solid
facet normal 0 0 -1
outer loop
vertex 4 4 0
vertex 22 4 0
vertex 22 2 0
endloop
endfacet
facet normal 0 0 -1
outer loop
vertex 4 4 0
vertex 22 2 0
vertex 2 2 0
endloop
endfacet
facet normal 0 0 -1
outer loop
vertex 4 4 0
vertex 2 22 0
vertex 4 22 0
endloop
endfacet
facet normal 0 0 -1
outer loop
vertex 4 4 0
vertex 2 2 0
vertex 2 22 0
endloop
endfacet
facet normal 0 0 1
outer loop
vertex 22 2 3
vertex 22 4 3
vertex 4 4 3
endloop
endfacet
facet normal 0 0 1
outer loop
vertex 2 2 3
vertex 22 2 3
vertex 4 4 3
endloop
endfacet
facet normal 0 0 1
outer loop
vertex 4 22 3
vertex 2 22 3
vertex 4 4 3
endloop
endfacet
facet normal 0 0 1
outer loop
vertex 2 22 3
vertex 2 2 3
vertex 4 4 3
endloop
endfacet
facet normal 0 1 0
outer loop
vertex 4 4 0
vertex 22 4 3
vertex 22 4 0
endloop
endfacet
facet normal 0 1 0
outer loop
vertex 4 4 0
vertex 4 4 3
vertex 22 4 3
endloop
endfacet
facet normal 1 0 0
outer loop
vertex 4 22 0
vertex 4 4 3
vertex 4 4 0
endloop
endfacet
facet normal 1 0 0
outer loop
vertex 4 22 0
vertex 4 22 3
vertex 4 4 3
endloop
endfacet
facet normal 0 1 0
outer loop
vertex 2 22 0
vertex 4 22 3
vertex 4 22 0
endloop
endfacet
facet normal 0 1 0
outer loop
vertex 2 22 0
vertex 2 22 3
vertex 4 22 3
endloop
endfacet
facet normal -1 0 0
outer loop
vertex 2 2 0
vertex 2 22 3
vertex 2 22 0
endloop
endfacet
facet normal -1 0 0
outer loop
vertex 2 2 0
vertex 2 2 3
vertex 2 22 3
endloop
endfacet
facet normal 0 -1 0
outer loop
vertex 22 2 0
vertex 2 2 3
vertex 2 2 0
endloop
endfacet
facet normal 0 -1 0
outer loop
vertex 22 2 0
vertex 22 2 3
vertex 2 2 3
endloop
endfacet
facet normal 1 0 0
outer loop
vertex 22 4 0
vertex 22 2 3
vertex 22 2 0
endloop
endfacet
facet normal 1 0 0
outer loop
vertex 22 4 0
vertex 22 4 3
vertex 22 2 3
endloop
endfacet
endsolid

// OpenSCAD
linear_extrude(3) offset(delta=-2) polygon([[0,0],[24,0],[24,6],[6,6],[6,24],[0,24]]);
